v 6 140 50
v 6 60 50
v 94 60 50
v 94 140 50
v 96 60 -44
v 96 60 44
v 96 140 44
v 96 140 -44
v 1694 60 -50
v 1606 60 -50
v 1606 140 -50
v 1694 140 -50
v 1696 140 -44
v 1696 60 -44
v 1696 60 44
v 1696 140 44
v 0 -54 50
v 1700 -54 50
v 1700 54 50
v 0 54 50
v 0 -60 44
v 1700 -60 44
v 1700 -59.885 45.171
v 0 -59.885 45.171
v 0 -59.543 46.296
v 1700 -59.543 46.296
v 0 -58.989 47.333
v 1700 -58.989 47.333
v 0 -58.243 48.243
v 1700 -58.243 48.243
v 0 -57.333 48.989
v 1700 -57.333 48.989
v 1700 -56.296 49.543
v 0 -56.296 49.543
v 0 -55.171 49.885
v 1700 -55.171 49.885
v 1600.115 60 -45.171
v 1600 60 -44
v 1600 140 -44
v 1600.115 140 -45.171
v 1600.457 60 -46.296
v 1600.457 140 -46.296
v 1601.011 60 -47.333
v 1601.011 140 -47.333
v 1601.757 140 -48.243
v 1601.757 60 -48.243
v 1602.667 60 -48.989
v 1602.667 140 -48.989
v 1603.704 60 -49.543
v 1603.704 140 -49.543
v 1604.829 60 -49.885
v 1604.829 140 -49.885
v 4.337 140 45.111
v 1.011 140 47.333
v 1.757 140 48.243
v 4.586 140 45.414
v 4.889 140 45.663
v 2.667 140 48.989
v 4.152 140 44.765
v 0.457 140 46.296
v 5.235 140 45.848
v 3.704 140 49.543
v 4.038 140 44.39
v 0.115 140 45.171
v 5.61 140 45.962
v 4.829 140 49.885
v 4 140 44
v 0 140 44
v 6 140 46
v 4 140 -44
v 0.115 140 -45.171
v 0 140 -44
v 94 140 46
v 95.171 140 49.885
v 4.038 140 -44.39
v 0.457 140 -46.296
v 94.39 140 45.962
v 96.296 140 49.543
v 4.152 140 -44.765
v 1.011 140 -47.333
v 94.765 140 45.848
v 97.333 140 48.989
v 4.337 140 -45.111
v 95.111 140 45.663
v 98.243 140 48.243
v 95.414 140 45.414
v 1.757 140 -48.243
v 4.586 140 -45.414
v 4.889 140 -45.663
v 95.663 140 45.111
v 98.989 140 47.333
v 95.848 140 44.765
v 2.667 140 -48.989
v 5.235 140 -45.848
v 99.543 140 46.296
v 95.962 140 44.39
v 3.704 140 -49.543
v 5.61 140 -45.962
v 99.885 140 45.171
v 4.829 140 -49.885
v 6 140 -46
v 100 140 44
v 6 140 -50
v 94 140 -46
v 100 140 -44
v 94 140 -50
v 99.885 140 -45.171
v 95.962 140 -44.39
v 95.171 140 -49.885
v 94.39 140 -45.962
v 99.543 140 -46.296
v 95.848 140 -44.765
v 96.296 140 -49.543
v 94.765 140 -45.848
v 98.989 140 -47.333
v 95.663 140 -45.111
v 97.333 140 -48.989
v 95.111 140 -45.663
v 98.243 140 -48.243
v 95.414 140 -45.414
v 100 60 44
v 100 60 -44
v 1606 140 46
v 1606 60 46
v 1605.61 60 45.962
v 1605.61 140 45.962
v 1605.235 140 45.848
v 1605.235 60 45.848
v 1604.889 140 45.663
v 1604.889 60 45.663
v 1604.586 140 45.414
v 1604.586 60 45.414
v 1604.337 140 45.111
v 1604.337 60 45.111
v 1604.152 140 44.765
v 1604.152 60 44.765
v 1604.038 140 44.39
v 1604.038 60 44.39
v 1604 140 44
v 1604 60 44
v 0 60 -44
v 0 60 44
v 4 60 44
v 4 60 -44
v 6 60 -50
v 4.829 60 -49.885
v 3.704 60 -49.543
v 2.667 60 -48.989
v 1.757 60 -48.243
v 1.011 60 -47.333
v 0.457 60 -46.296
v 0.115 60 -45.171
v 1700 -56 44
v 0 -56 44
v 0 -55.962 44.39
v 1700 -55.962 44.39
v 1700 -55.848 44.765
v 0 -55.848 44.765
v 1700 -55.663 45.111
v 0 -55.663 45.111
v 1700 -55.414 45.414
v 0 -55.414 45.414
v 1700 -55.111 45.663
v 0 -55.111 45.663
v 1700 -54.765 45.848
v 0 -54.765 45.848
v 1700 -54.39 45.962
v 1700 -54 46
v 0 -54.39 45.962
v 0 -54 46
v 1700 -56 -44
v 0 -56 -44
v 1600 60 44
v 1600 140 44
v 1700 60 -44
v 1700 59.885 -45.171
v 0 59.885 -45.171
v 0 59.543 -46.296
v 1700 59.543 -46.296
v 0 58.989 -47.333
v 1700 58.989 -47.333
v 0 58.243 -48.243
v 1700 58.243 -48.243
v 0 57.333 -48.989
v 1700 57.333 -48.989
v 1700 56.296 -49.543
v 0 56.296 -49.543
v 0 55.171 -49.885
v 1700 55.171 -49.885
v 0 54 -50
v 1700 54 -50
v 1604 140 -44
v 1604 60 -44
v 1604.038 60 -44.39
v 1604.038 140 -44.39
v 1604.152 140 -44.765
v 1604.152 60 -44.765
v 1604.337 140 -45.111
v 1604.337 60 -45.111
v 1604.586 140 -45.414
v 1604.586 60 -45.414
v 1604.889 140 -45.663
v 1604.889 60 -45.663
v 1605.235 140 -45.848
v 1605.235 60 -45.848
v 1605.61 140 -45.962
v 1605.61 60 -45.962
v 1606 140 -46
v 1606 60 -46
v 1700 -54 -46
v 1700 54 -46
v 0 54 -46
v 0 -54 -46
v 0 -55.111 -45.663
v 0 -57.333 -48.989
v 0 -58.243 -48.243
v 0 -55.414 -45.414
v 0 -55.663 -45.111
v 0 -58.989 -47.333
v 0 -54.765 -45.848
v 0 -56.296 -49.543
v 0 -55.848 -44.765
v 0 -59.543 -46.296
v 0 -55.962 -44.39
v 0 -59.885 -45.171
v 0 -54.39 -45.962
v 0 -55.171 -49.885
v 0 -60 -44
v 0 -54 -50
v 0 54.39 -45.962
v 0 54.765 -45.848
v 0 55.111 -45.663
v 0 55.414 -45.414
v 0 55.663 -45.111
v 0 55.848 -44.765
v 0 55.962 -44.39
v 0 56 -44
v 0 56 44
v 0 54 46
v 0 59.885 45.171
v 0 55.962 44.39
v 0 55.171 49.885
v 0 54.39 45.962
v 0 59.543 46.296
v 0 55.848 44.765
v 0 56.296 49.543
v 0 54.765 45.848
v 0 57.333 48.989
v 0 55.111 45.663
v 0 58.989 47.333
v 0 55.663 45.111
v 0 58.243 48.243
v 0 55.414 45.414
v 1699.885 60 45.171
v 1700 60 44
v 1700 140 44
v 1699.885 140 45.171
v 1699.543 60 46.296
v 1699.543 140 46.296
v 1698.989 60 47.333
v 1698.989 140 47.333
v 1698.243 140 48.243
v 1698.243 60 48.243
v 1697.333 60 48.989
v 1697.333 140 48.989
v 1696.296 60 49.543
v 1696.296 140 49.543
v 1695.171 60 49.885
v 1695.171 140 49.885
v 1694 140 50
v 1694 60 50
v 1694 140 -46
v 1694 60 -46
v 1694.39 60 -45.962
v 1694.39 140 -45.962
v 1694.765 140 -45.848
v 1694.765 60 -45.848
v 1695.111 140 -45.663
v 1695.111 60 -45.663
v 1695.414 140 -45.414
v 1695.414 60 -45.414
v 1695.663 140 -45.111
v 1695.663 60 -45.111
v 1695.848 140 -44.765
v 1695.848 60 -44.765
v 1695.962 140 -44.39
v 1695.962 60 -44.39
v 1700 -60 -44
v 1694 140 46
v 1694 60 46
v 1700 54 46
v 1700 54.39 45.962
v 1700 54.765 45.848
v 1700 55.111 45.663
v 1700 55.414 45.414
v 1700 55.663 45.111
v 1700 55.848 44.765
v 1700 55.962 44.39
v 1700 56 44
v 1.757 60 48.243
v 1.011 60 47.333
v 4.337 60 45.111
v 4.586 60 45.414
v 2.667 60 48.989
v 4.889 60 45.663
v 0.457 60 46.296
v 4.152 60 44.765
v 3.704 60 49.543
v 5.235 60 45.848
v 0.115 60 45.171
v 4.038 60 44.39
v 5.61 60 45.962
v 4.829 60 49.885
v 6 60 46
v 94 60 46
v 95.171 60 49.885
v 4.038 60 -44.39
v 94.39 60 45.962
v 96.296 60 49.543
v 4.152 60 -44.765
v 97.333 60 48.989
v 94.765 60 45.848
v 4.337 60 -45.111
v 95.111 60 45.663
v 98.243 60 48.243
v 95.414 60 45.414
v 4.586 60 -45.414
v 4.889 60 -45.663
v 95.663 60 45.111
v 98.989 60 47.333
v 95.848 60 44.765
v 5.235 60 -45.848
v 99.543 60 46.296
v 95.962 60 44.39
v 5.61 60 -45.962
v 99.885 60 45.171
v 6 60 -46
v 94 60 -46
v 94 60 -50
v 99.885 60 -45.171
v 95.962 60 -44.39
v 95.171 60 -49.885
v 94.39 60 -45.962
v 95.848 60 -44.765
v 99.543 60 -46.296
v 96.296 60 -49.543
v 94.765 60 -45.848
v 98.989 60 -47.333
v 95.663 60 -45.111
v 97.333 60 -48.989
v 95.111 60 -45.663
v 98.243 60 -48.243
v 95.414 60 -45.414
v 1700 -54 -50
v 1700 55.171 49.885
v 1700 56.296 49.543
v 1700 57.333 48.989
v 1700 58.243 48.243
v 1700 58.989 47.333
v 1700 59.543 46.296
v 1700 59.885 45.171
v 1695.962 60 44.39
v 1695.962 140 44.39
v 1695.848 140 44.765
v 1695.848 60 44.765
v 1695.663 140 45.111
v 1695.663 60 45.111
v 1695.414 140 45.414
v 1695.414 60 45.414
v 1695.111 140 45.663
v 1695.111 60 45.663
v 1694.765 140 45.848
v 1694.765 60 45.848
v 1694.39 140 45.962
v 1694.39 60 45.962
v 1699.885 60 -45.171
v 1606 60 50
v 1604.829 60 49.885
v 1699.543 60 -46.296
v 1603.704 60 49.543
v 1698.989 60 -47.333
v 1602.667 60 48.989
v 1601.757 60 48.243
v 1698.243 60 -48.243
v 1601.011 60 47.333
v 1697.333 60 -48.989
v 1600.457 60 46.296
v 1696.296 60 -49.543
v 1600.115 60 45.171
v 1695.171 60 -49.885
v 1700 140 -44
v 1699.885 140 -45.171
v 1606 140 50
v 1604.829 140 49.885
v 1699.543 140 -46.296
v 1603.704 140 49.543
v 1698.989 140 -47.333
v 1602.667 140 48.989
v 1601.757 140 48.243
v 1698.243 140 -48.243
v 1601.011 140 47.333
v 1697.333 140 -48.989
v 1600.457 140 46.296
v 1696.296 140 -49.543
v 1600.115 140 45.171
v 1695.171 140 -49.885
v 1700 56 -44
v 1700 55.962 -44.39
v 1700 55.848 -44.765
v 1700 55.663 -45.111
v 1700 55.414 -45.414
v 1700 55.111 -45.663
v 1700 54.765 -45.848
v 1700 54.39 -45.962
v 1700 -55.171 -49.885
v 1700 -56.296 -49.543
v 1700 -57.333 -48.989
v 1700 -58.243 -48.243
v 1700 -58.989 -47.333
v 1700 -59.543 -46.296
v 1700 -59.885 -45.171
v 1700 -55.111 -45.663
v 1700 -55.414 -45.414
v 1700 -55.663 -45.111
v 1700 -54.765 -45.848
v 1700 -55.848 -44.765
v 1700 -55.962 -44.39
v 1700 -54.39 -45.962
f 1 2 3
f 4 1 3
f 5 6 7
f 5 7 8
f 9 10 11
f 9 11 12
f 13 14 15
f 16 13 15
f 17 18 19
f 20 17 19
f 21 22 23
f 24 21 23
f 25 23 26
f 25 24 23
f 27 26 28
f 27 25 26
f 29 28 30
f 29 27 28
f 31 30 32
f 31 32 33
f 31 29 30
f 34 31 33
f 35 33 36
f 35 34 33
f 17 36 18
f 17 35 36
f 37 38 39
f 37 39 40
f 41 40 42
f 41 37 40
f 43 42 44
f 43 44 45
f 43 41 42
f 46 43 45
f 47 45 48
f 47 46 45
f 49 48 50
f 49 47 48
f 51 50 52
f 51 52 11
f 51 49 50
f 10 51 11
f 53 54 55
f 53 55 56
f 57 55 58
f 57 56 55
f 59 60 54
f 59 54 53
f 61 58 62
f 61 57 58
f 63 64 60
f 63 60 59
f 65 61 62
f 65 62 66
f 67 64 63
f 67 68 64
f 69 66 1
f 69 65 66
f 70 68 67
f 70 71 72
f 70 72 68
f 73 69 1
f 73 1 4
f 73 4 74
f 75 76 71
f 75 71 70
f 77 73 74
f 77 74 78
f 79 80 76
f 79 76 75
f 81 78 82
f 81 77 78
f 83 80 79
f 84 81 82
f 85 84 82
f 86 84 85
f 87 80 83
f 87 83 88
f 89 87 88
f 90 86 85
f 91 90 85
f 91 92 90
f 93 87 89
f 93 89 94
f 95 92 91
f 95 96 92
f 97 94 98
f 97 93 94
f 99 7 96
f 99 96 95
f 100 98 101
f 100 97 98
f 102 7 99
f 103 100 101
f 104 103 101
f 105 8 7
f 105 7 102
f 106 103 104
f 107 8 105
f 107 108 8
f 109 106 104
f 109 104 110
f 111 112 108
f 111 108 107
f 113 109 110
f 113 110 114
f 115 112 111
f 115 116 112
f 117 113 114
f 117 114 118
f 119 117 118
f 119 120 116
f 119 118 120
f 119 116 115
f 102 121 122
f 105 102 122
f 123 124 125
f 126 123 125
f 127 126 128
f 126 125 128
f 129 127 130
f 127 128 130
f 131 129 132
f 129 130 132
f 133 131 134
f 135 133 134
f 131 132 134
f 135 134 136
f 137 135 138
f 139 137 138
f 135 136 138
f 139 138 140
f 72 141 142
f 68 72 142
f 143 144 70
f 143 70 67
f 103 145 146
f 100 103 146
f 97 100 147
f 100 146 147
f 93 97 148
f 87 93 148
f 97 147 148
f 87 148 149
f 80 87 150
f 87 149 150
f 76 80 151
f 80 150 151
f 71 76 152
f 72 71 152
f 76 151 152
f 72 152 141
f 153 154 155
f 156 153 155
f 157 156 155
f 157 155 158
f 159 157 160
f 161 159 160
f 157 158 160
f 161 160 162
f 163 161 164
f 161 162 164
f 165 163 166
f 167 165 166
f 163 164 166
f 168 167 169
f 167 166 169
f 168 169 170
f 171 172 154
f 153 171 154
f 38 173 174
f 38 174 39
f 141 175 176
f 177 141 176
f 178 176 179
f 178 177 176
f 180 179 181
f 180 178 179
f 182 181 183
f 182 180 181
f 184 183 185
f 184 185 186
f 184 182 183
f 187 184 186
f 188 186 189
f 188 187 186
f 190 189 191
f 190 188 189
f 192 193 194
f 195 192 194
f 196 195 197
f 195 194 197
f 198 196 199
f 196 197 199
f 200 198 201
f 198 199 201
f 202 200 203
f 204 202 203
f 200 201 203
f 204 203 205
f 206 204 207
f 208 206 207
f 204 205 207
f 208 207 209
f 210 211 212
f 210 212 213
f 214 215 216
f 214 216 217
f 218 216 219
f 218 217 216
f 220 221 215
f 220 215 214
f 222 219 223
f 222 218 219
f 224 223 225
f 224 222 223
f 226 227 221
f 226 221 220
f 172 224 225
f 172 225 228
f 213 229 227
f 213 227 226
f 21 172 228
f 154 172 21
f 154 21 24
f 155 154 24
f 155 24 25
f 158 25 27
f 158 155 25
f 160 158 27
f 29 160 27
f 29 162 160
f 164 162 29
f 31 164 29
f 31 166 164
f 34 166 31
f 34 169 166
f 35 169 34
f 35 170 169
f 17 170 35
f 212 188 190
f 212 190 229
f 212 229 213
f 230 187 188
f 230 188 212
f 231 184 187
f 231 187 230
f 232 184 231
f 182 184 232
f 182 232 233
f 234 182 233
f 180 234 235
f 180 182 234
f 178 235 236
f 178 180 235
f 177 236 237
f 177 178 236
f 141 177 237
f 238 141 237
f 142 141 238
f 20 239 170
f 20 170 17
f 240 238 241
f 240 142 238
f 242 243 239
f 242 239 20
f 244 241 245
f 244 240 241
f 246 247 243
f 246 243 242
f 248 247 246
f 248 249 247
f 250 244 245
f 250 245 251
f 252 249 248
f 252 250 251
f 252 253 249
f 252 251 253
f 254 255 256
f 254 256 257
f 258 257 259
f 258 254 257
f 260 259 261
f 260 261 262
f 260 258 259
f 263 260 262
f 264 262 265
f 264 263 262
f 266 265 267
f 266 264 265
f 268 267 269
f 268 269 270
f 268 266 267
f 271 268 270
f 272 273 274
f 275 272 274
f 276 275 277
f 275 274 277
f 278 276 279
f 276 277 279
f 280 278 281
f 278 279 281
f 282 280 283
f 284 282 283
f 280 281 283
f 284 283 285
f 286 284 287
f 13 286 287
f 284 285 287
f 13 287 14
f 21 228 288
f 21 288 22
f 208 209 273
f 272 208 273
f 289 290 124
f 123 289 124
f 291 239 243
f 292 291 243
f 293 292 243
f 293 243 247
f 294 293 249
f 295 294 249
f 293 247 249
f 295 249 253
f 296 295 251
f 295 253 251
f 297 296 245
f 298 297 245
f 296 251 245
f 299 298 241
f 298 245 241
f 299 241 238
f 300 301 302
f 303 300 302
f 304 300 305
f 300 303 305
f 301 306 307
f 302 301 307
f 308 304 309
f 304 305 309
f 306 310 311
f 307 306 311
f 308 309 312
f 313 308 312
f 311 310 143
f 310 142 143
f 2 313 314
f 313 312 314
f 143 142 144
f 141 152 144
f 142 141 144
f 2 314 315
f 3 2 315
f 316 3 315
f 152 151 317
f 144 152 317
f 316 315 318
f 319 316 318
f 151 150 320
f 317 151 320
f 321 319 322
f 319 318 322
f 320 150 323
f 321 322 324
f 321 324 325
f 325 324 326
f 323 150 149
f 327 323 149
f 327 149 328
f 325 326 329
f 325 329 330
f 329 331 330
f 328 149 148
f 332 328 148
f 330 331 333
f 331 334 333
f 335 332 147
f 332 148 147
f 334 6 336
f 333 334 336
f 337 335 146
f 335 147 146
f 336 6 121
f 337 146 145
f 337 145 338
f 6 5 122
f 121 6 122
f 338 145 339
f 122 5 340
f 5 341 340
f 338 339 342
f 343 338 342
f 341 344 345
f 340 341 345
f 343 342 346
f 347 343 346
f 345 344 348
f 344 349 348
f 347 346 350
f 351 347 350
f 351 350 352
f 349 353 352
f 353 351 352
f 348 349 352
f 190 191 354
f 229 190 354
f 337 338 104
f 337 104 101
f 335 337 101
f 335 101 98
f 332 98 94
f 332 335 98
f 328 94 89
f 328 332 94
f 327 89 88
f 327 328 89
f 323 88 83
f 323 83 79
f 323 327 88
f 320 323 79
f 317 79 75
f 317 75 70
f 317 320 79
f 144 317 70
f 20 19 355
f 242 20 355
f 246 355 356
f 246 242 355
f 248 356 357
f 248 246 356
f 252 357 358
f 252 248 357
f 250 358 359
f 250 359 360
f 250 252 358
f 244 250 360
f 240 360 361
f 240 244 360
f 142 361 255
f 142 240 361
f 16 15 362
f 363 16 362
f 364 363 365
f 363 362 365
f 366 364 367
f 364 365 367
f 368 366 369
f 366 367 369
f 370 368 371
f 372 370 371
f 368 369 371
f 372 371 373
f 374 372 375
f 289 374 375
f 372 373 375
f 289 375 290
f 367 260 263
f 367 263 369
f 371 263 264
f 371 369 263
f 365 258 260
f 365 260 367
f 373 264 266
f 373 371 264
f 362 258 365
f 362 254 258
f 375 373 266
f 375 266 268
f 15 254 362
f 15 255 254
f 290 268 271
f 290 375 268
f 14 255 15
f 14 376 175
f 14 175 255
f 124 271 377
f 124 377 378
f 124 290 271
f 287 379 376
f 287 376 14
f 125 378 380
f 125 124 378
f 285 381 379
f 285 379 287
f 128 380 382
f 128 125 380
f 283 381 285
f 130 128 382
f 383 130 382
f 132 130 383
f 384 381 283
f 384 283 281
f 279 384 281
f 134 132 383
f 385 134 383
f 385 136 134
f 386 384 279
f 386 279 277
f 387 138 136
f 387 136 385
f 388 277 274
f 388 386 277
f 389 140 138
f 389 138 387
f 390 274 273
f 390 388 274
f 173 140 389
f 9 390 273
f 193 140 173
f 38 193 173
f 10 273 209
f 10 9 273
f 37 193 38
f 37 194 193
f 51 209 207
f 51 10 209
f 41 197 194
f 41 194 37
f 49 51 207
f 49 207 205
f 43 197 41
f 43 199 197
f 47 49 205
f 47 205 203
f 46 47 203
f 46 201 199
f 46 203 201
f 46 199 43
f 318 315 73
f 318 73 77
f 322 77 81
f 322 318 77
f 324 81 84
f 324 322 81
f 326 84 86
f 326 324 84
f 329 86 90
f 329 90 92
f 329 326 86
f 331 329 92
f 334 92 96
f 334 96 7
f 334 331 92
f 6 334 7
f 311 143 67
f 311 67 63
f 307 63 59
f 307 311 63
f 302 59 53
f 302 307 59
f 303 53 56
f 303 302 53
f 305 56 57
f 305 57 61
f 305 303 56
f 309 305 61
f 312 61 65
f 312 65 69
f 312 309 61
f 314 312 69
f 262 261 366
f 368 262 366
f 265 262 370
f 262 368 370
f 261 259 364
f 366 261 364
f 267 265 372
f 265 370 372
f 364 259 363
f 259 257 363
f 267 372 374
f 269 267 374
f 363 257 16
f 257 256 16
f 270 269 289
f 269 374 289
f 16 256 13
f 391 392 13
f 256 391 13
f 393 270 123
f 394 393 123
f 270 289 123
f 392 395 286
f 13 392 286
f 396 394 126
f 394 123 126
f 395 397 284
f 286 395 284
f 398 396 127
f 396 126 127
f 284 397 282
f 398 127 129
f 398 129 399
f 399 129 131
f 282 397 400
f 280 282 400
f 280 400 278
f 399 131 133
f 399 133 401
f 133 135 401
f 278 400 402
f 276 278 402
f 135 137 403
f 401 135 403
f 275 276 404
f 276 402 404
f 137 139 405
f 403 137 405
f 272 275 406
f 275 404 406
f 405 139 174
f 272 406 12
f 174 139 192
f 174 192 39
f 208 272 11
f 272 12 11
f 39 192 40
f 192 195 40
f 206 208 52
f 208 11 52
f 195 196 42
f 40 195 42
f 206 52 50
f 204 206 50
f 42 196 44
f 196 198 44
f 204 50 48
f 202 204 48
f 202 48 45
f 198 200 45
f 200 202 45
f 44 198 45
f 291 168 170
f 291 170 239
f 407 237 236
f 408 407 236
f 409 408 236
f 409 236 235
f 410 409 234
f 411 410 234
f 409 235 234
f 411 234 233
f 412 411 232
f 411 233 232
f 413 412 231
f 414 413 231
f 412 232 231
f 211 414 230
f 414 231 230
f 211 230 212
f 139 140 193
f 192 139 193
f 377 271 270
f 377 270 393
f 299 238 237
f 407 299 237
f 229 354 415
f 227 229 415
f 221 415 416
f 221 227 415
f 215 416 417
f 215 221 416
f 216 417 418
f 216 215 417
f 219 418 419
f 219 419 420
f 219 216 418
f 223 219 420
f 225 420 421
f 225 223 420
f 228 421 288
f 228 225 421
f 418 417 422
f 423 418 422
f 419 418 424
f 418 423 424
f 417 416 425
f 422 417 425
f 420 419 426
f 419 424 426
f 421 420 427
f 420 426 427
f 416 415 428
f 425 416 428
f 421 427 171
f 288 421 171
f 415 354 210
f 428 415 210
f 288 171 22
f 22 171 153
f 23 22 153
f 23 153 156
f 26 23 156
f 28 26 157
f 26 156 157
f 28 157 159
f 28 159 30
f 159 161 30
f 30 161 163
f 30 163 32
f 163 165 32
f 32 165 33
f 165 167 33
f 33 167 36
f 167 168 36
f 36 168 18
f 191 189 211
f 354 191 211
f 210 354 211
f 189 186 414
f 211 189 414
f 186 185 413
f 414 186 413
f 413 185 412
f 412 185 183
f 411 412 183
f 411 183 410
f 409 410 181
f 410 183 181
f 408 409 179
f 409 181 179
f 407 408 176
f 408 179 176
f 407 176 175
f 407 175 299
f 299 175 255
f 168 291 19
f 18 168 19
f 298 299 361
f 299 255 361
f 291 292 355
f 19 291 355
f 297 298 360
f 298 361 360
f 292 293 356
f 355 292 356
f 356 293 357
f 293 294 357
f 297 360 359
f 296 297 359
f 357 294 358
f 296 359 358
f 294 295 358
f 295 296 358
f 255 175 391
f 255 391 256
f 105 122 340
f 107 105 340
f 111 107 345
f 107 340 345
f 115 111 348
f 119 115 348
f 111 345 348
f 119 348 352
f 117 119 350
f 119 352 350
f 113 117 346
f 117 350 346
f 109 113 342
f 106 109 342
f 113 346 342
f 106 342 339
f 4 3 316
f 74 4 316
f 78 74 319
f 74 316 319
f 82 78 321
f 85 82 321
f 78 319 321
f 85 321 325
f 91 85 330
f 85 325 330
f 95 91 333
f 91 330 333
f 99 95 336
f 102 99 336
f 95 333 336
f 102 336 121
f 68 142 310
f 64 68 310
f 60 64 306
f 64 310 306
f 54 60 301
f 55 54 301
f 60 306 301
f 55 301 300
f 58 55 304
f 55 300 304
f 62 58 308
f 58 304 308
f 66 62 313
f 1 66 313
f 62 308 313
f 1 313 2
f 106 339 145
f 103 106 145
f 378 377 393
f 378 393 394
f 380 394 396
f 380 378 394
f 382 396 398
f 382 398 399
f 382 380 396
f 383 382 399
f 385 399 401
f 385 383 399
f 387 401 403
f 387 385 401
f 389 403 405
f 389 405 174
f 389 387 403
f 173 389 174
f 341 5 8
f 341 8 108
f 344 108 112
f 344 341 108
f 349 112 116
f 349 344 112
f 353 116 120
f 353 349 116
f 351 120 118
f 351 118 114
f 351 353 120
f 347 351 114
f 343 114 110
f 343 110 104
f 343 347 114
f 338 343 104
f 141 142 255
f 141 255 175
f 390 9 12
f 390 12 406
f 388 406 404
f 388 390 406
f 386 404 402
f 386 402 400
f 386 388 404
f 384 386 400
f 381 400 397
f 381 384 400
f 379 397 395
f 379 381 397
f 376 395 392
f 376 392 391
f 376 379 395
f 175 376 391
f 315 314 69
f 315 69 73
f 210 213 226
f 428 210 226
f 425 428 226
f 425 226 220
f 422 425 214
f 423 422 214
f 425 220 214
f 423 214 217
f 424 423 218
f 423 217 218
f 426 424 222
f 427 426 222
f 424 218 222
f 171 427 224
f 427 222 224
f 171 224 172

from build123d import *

# Parameters (mm, degrees)
DODANIE_WYCI_GNI_CIE1_DEPTH = 1700
DODANIE_WYCI_GNI_CIE2_DEPTH = 80


with BuildPart() as part:
    # Szkic1 → Dodanie-wyciągnięcie1 (new body)
    with BuildSketch(Plane(origin=(0, 0, 0), x_dir=(0, 0, -1), z_dir=(1, 0, 0))):
        with BuildLine():
            Line((-44, 60), (44, 60))
            ThreePointArc((44, 60), (48.242640687, 58.242640687), (50, 54))
            Line((50, 54), (50, -54))
            ThreePointArc((50, -54), (48.242640687, -58.242640687), (44, -60))
            Line((44, -60), (-44, -60))
            ThreePointArc((-44, -60), (-48.242640687, -58.242640687), (-50, -54))
            Line((-50, -54), (-50, 54))
            ThreePointArc((-50, 54), (-48.242640687, 58.242640687), (-44, 60))
        make_face()
        with BuildLine():
            Line((-44, 56), (44, 56))
            ThreePointArc((44, 56), (45.414213562, 55.414213562), (46, 54))
            Line((46, 54), (46, -54))
            ThreePointArc((46, -54), (45.414213562, -55.414213562), (44, -56))
            Line((44, -56), (-44, -56))
            ThreePointArc((-44, -56), (-45.414213562, -55.414213562), (-46, -54))
            Line((-46, -54), (-46, 54))
            ThreePointArc((-46, 54), (-45.414213562, 55.414213562), (-44, 56))
        make_face(mode=Mode.SUBTRACT)
    extrude(amount=DODANIE_WYCI_GNI_CIE1_DEPTH)


with BuildPart() as body_2:
    # Szkic2 → Dodanie-wyciągnięcie2 (new body)
    with BuildSketch(Plane(origin=(0, 60, 0), x_dir=(1, 0, 0), z_dir=(0, 1, 0))):
        with BuildLine():
            Line((1606, 50), (1694, 50))
            ThreePointArc((1694, 50), (1698.242640687, 48.242640687), (1700, 44))
            Line((1700, 44), (1700, -44))
            ThreePointArc((1700, -44), (1698.242640687, -48.242640687), (1694, -50))
            Line((1694, -50), (1606, -50))
            ThreePointArc((1606, -50), (1601.757359313, -48.242640687), (1600, -44))
            Line((1600, -44), (1600, 44))
            ThreePointArc((1600, 44), (1601.757359313, 48.242640687), (1606, 50))
        make_face()
        with BuildLine():
            Line((1606, 46), (1694, 46))
            ThreePointArc((1694, 46), (1695.414213562, 45.414213562), (1696, 44))
            Line((1696, 44), (1696, -44))
            ThreePointArc((1696, -44), (1695.414213562, -45.414213562), (1694, -46))
            Line((1694, -46), (1606, -46))
            ThreePointArc((1606, -46), (1604.585786438, -45.414213562), (1604, -44))
            Line((1604, -44), (1604, 44))
            ThreePointArc((1604, 44), (1604.585786438, 45.414213562), (1606, 46))
        make_face(mode=Mode.SUBTRACT)
    extrude(amount=DODANIE_WYCI_GNI_CIE2_DEPTH)


with BuildPart() as body_3:
    # Lustro3: mirrored copy
    add(body_2.part.mirror(Plane.ZY.offset(-850)))


solid = Compound([part.part, body_2.part, body_3.part])
